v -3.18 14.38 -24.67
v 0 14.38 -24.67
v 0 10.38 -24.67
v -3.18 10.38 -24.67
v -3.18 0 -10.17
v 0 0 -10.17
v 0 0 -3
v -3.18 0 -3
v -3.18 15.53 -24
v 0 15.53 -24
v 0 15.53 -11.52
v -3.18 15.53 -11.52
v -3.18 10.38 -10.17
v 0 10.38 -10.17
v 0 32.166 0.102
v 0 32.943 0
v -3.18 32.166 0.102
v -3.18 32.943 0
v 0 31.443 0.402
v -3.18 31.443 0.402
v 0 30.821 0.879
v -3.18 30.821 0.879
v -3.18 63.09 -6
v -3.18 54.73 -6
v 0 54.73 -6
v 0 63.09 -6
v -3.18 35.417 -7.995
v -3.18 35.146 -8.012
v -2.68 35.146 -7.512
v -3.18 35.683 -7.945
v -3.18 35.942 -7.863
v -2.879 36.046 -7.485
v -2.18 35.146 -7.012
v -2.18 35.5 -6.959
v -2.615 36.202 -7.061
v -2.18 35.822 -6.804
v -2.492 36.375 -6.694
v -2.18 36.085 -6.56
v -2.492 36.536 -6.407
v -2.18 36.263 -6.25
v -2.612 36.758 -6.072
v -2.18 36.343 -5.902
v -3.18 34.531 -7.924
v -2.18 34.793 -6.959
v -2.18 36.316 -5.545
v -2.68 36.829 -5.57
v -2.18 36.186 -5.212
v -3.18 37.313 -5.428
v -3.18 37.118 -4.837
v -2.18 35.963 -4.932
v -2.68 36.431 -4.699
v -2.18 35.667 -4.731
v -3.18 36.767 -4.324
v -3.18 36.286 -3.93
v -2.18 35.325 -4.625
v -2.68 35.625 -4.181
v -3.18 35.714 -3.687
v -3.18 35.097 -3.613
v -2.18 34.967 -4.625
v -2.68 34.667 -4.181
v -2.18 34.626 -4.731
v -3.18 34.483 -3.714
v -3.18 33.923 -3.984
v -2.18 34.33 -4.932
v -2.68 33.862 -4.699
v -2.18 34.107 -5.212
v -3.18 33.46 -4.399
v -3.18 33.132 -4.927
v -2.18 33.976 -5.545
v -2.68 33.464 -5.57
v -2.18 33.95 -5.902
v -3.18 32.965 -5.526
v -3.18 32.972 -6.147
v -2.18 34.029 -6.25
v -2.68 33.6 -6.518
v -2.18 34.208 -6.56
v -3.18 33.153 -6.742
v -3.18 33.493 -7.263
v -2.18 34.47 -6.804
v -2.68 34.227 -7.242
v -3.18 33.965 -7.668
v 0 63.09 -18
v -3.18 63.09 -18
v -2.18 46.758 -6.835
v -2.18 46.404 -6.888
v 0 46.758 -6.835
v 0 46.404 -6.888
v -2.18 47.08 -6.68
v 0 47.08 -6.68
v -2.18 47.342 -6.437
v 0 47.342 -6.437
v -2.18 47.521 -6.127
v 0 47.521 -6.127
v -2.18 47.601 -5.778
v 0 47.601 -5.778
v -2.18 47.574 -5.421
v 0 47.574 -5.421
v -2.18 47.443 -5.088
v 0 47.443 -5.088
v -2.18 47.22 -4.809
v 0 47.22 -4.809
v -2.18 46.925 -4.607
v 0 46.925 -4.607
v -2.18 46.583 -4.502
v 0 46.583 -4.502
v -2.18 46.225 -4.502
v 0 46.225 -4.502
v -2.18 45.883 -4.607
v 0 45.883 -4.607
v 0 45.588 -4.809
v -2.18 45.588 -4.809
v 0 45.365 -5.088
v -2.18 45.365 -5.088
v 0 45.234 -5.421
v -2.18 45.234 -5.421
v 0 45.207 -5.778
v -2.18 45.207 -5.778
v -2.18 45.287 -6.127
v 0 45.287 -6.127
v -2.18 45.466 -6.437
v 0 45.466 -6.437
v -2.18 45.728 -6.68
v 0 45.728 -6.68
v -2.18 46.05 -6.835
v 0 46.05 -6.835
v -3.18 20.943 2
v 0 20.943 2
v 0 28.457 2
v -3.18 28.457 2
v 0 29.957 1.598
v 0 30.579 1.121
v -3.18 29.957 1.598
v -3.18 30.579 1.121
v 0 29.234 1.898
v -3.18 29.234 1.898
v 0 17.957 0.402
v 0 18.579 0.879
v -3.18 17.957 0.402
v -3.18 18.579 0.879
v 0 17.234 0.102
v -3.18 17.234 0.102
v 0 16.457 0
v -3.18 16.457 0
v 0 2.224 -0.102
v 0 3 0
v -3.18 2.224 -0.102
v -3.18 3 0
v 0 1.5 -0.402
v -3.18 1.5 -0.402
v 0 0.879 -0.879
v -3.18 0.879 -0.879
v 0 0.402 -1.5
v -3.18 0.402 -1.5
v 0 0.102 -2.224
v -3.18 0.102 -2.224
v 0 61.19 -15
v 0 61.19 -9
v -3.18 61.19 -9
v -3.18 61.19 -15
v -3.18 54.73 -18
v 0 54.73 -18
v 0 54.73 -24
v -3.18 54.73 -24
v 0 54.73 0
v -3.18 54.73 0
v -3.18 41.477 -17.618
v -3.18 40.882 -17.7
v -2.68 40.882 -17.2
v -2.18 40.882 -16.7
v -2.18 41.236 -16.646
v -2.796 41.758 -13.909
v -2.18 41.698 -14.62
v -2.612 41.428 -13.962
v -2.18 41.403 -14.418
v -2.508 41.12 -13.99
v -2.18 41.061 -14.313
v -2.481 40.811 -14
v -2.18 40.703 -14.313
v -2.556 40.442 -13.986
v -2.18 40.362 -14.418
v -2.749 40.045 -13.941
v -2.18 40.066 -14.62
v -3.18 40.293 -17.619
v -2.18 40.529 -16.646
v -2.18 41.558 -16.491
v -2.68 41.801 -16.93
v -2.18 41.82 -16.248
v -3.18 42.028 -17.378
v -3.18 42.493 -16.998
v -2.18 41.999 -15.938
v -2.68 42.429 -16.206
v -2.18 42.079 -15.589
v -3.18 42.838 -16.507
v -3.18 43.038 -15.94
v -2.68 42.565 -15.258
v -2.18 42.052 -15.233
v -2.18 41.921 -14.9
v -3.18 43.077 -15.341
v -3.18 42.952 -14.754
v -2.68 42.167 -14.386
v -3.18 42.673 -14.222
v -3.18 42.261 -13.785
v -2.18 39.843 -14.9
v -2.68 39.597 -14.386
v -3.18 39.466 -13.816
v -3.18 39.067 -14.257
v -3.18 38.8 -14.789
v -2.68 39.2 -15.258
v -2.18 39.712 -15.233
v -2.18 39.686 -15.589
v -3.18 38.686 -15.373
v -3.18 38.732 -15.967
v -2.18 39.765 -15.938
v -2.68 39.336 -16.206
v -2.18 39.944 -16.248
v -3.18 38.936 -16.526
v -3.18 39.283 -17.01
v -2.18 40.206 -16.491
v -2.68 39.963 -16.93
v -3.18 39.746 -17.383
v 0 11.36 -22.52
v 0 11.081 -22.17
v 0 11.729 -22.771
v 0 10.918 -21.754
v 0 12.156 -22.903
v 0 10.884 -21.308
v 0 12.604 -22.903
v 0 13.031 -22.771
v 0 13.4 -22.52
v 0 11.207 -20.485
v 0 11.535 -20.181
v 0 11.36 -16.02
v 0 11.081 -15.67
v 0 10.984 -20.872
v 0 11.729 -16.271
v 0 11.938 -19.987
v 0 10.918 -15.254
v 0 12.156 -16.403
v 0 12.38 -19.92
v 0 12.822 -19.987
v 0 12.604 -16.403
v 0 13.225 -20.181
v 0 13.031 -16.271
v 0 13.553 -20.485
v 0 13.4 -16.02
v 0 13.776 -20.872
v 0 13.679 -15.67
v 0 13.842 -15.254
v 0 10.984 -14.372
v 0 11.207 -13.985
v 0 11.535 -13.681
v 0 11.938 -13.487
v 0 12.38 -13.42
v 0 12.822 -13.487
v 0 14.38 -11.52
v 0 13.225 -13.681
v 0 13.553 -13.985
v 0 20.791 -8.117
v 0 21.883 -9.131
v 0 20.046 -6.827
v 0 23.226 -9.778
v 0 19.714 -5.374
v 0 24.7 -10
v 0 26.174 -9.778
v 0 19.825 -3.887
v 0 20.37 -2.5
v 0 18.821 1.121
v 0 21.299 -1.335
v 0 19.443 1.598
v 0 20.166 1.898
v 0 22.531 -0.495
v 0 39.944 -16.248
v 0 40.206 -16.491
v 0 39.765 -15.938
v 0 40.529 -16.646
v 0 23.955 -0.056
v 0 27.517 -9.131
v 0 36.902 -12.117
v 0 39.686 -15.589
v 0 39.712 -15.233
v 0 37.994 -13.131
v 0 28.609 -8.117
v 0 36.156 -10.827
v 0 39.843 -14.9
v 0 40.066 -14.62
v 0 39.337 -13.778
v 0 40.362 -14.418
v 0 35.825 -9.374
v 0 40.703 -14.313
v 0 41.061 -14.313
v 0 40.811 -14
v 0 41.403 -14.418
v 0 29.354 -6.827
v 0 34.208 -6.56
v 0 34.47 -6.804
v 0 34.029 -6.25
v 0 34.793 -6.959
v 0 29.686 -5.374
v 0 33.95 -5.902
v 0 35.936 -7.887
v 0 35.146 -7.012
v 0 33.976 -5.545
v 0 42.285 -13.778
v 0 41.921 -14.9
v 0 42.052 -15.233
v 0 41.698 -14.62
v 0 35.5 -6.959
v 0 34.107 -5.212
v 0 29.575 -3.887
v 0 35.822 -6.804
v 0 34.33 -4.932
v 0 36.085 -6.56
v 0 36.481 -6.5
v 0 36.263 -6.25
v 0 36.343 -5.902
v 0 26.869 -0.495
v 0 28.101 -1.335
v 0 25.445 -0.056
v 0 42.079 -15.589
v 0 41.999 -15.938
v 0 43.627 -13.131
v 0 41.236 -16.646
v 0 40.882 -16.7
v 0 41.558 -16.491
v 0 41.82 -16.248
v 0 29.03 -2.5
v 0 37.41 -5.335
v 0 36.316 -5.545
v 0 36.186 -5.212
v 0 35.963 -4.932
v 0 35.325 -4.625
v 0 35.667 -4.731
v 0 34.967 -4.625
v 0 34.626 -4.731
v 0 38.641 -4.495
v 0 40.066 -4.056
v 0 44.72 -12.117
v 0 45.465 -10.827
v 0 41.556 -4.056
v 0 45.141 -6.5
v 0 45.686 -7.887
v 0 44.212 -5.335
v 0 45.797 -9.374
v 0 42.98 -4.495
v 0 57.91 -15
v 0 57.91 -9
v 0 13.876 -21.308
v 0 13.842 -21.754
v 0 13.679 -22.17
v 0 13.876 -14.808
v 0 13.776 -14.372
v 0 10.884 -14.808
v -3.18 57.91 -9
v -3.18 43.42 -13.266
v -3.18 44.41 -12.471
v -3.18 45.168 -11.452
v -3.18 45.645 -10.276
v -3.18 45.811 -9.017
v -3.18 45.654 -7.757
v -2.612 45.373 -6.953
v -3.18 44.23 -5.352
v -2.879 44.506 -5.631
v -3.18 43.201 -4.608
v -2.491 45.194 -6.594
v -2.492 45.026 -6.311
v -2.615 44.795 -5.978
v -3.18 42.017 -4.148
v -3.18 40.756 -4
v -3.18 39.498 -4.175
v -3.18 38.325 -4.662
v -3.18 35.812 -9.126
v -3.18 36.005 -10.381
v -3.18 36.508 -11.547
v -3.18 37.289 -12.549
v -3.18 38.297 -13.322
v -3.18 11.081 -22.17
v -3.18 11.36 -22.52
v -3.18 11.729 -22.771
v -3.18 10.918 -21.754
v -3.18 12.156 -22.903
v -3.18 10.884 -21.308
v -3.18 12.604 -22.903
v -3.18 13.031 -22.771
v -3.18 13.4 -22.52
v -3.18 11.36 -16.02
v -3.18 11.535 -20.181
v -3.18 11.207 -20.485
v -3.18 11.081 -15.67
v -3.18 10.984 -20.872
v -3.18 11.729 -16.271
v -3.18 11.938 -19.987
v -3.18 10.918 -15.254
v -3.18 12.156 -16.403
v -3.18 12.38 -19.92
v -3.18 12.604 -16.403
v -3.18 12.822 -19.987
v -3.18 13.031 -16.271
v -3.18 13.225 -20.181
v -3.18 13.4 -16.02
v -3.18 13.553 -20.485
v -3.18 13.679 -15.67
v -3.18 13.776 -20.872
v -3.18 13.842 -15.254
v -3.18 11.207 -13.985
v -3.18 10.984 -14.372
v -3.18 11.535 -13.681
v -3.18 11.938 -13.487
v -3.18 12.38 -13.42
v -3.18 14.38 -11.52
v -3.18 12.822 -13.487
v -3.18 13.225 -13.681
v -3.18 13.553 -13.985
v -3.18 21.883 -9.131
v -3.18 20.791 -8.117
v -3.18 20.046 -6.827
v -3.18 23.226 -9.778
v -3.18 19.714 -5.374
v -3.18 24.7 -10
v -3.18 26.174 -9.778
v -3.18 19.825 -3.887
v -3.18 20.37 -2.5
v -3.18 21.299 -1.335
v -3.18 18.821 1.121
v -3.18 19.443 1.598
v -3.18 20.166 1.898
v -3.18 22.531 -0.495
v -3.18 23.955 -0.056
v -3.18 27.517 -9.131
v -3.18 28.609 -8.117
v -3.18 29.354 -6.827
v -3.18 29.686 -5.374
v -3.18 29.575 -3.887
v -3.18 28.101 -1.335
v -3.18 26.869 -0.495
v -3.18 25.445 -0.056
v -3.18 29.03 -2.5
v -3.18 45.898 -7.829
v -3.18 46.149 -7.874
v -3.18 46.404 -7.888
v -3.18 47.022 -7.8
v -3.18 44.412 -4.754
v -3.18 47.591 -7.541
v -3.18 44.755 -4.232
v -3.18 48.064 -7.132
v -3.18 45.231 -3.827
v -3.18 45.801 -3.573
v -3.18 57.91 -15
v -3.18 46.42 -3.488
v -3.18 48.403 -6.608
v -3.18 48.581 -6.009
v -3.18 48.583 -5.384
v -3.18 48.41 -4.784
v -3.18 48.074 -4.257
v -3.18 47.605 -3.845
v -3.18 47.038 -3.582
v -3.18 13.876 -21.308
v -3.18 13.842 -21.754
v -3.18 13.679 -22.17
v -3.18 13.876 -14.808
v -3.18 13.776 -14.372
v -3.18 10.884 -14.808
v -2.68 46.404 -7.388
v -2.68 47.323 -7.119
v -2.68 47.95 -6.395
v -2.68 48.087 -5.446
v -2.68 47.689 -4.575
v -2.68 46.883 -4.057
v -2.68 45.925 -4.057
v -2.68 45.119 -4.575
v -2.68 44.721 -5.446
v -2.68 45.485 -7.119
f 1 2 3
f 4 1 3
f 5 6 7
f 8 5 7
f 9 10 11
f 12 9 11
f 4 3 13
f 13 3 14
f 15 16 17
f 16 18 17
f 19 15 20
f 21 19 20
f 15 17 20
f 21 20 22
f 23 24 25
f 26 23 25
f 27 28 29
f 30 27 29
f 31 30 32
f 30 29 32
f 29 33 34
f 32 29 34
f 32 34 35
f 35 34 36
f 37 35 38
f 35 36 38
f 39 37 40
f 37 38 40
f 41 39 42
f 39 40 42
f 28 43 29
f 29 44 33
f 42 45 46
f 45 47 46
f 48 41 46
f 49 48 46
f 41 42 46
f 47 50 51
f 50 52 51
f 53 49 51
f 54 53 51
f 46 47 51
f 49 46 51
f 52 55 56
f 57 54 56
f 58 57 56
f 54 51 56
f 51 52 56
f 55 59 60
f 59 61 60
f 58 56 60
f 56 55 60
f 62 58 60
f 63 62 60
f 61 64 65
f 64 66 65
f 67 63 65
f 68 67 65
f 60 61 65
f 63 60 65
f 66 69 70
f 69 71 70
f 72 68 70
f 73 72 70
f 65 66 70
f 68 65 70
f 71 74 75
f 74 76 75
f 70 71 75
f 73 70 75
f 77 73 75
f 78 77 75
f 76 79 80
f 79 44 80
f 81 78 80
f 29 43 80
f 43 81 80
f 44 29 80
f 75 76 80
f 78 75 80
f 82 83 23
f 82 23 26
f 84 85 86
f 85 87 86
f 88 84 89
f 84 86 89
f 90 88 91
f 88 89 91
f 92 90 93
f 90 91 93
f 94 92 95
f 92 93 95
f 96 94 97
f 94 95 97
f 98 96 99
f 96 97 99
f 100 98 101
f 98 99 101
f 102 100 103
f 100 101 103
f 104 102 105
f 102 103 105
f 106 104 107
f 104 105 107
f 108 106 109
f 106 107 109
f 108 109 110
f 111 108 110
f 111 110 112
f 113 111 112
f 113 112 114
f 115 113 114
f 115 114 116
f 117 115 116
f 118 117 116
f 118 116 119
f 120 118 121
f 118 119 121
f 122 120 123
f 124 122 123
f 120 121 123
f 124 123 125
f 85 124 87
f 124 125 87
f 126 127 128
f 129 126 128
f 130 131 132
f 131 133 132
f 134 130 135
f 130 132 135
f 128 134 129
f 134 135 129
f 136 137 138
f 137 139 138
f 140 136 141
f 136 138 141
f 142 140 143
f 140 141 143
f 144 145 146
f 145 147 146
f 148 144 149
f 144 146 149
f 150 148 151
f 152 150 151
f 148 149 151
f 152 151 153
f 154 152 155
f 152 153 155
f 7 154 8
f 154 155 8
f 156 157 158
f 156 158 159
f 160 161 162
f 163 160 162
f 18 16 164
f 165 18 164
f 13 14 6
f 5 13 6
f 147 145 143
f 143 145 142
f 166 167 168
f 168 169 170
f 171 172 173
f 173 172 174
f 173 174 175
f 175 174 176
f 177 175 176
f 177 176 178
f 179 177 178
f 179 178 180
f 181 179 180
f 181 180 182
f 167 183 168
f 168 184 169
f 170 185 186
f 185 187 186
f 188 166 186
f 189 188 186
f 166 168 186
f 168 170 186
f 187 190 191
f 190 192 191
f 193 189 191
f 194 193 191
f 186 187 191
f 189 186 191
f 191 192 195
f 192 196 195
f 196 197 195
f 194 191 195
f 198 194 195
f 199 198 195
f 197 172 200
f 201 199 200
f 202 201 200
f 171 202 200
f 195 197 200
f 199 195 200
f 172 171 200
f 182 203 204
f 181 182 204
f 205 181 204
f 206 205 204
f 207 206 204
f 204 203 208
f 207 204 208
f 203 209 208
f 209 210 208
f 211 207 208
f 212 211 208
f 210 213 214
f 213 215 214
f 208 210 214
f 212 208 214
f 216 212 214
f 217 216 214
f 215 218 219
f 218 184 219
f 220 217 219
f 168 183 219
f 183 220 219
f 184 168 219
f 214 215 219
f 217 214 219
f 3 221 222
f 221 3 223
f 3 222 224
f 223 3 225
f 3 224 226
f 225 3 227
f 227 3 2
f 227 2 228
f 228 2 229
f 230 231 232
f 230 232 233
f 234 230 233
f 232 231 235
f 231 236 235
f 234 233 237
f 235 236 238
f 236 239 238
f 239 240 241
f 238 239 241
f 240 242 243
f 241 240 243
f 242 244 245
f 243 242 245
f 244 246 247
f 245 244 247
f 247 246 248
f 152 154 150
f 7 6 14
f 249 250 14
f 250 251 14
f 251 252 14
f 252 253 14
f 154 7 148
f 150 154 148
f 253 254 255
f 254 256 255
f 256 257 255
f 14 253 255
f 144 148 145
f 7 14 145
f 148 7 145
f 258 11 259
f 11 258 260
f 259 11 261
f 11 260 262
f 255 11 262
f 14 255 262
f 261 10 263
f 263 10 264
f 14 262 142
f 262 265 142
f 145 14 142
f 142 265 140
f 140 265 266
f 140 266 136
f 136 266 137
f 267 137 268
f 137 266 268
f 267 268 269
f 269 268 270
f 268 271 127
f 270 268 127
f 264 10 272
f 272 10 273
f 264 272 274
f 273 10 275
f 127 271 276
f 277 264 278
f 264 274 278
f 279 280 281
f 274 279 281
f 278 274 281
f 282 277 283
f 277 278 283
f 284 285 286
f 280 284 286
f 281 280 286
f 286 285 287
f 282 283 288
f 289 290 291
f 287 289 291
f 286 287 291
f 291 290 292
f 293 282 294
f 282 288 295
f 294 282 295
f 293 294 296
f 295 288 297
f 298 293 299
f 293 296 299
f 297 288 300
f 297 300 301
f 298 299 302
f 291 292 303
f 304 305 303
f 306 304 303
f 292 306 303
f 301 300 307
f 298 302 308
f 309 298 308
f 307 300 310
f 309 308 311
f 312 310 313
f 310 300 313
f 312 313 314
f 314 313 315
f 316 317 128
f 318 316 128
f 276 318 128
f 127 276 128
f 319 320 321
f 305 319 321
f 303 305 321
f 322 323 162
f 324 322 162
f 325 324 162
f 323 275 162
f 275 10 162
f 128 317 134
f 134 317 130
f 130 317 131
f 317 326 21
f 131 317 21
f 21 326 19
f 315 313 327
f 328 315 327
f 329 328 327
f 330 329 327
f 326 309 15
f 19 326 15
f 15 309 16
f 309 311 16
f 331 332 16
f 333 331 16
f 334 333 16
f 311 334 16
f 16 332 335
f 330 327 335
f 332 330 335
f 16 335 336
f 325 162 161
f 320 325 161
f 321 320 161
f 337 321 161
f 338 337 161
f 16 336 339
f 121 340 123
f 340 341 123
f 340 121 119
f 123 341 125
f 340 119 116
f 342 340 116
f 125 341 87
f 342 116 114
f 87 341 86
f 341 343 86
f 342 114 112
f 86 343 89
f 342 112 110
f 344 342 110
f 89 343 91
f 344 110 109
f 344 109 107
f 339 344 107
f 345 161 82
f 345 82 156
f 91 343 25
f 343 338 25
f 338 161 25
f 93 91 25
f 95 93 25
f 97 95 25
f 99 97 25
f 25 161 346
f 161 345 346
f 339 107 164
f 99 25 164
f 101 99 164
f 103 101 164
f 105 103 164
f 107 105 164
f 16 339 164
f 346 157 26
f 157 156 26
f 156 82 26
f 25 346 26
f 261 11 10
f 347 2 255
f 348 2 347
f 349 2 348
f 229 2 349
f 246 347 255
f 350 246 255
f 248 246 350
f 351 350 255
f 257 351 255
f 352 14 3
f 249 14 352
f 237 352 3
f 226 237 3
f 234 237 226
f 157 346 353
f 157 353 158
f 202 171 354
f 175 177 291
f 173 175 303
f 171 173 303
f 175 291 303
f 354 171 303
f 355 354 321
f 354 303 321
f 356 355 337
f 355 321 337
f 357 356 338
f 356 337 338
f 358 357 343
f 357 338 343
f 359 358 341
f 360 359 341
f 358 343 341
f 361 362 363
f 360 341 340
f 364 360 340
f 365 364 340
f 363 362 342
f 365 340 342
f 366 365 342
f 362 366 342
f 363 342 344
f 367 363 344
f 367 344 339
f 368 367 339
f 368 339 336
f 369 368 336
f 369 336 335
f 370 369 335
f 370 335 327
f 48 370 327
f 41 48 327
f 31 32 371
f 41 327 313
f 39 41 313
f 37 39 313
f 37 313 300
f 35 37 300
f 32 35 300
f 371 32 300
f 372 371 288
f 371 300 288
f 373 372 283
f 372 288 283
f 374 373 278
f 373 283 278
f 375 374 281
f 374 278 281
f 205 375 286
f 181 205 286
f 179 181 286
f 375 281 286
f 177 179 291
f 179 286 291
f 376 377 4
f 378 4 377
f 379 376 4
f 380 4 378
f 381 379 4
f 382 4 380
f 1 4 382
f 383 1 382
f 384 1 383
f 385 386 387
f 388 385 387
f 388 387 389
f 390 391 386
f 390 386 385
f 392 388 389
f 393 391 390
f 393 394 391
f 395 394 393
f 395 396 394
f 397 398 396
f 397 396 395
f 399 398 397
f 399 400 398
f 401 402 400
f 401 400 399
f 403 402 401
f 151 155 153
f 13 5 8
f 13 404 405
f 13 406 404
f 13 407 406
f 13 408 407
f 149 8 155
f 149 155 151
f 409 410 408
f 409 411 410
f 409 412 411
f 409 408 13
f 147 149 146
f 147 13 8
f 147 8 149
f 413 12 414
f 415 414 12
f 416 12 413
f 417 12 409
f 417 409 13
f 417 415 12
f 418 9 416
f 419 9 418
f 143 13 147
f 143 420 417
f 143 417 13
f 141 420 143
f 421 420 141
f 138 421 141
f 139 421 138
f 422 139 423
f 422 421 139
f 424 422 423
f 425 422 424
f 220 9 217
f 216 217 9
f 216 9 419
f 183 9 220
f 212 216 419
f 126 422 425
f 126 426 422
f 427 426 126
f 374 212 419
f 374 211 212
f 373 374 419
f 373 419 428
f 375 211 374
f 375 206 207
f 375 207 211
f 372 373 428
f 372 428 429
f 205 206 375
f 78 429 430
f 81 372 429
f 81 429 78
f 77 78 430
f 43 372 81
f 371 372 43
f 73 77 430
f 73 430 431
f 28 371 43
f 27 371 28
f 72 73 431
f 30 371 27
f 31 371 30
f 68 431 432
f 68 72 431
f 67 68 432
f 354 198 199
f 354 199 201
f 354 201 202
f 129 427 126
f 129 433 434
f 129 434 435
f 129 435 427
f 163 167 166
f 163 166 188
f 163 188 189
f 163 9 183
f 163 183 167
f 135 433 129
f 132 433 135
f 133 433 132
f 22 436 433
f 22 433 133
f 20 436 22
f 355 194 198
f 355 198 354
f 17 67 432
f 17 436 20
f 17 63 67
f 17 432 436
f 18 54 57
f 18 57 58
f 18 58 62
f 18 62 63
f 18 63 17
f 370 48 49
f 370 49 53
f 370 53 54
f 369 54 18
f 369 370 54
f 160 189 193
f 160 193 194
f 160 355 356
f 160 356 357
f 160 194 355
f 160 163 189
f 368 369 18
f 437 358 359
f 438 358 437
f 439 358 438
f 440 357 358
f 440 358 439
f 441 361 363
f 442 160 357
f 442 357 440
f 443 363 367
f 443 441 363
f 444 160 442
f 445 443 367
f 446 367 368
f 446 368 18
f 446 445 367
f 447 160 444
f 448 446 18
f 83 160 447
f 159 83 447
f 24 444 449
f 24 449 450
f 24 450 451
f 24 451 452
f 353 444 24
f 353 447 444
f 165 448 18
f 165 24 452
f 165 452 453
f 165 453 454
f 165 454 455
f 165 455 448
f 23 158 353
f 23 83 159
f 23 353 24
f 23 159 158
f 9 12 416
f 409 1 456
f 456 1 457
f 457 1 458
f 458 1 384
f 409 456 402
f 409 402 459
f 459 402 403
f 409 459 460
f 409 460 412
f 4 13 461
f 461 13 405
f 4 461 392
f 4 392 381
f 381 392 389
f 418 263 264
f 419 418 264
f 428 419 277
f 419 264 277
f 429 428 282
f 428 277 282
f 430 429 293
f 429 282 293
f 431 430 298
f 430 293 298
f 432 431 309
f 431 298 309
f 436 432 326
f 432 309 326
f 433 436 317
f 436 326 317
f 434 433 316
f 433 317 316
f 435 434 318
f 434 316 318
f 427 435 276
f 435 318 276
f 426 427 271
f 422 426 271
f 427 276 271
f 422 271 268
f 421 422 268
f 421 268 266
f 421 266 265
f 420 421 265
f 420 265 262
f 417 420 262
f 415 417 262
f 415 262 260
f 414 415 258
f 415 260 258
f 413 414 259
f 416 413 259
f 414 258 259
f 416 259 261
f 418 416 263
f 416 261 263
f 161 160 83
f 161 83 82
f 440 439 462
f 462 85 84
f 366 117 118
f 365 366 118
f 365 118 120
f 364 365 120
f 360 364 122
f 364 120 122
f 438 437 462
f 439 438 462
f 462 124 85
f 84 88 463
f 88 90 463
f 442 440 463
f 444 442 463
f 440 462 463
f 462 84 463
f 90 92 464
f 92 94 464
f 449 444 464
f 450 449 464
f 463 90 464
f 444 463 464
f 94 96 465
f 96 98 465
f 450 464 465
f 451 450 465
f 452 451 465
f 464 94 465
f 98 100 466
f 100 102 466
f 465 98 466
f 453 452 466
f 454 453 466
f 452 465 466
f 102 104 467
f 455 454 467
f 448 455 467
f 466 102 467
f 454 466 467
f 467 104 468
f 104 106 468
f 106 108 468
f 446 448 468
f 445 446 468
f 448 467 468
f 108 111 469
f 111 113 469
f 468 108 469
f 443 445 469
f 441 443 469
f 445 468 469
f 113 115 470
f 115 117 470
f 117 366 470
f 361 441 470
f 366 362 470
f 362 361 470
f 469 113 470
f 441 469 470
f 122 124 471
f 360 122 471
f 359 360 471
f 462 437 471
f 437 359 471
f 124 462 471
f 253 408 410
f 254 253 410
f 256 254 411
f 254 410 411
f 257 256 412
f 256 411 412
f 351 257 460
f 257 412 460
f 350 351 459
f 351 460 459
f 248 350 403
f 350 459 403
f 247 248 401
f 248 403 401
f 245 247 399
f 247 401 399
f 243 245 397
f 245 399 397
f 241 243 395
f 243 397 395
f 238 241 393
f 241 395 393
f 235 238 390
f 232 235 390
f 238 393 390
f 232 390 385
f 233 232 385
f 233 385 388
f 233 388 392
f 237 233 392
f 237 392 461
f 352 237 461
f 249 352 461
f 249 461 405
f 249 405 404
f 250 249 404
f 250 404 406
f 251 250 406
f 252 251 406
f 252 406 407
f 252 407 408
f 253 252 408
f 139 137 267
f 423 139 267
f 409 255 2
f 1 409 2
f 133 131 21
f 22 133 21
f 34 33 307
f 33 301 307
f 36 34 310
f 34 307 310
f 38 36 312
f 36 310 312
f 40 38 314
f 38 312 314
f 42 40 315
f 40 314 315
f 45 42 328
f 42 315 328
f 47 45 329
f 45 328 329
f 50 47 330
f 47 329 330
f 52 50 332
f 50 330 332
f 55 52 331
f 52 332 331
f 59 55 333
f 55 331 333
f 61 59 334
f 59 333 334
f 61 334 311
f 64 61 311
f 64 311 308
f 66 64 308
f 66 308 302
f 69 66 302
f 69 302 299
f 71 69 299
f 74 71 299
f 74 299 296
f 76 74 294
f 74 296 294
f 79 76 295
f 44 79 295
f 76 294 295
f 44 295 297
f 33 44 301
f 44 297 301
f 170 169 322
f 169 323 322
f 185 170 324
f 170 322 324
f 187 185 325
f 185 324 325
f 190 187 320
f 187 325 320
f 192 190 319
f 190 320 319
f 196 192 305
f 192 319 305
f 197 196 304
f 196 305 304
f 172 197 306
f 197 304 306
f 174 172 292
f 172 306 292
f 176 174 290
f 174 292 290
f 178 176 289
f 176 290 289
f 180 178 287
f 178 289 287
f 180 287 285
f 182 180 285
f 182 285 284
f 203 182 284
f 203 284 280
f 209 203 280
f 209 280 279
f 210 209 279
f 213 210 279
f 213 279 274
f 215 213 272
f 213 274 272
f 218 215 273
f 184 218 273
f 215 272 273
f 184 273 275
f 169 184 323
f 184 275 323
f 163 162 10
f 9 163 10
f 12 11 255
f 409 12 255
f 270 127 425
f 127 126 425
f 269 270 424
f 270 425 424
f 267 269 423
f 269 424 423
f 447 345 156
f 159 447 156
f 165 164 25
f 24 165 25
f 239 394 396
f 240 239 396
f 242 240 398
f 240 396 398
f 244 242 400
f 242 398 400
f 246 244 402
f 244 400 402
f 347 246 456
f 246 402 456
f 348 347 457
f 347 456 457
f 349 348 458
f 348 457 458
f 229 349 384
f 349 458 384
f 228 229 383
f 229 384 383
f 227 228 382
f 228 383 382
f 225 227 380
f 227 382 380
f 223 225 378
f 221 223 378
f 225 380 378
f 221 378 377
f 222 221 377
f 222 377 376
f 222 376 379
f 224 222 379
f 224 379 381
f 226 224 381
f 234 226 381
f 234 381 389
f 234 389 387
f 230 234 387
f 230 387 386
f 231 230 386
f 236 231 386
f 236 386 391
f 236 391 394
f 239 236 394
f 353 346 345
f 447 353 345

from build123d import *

# Parameters (mm, degrees)
BOSS_EXTRUDE1_DEPTH                             = 3.18
SKETCH2_4_OUTSIDE_W                             = 40.864
SKETCH2_4_OUTSIDE_H                             = 68.924
SKETCH2_4_OUTSIDE_R                             = 5
CUT_EXTRUDE2_DEPTH                              = 3.18
FILLET6_R                                       = 3
CSK_FOR_M2_FLAT_HEAD_MACHINE_SCREW2_D           = 2.4
CSK_FOR_M2_FLAT_HEAD_MACHINE_SCREW2_CSINK_D     = 4.4
CSK_FOR_M2_FLAT_HEAD_MACHINE_SCREW2_CSINK_ANGLE = 90
M3X0_5_TAPPED_HOLE1_D                           = 3
M3X0_5_TAPPED_HOLE1_DEPTH                       = 3.328709071
M3X0_5_TAPPED_HOLE1_TIP                         = 0.901290929
SKETCH16_W                                      = 3.18
SKETCH16_H                                      = 12
BOSS_EXTRUDE2_DEPTH                             = 8.36
SKETCH18_W                                      = 6
SKETCH18_H                                      = 3.28
CUT_EXTRUDE3_DEPTH                              = 68.816439015


with BuildPart() as part:
    # Sketch2 → Boss-Extrude1 (new body)
    with BuildSketch(Plane(origin=(0, 0, 0), x_dir=(0, 0, -1), z_dir=(1, 0, 0))):
        Polygon((0, 54.73), (24, 54.73), (24, 15.53), (11.52, 15.53), (11.52, 14.38), (24.67, 14.38), (24.67, 10.38), (10.17, 10.38), (10.17, 0), (0, 0), (0, 17.7), (-2, 19.7), (-2, 29.7), (0, 31.7), align=None)
    extrude(amount=-BOSS_EXTRUDE1_DEPTH)

    # Sketch2<4> outside → Cut-Extrude2 (cut)
    # profile 1 of 3: a face of its own
    with BuildSketch(Plane(origin=(0, 0, 0), x_dir=(0, 0, -1), z_dir=(1, 0, 0))):
        with Locations((11.335, 27.365)):
            Rectangle(SKETCH2_4_OUTSIDE_W, SKETCH2_4_OUTSIDE_H)
        Polygon((0, 54.73), (24, 54.73), (24, 15.53), (11.52, 15.53), (11.52, 14.38), (24.67, 14.38), (24.67, 10.38), (10.17, 10.38), (10.17, 0), (0, 0), (0, 17.7), (-2, 19.7), (-2, 29.7), (0, 31.7), align=None, mode=Mode.SUBTRACT)
    # profile 2 of 3: a face of its own
    with BuildSketch(Plane(origin=(0, 0, 0), x_dir=(0, 0, -1), z_dir=(1, 0, 0))):
        with Locations((5, 24.7)):
            Circle(SKETCH2_4_OUTSIDE_R)
    # profile 3 of 3: a face of its own
    with BuildSketch(Plane(origin=(0, 0, 0), x_dir=(0, 0, -1), z_dir=(1, 0, 0))):
        with Locations((9, 40.810865899)):
            Circle(SKETCH2_4_OUTSIDE_R)
    extrude(amount=-CUT_EXTRUDE2_DEPTH, mode=Mode.SUBTRACT)

    # Fillet6
    fillet6_edges = [part.edges().sort_by_distance(p)[0] for p in [
        (-1.59, 31.7, 0),
        (-1.59, 29.7, 2),
        (-1.59, 19.7, 2),
        (-1.59, 17.7, 0),
        (-1.59, 0, 0),
    ]]
    fillet(fillet6_edges, radius=FILLET6_R)

    # CSK for M2 Flat Head Machine Screw2 (through all)
    with Locations(Plane.ZY.offset(3.18)):
        with Locations((-5.688374042, 46.403998609), (-15.499607993, 40.882251751), (-5.812017965, 35.146347336)):
            CounterSinkHole(CSK_FOR_M2_FLAT_HEAD_MACHINE_SCREW2_D / 2, CSK_FOR_M2_FLAT_HEAD_MACHINE_SCREW2_CSINK_D / 2, counter_sink_angle=CSK_FOR_M2_FLAT_HEAD_MACHINE_SCREW2_CSINK_ANGLE)

    # M3x0.5 Tapped Hole1
    with Locations(Plane(origin=(0, 0, 0), x_dir=(0, 0, -1), z_dir=(1, 0, 0))):
        with Locations((21.42, 12.38), (14.92, 12.38)):
            Hole(M3X0_5_TAPPED_HOLE1_D / 2, depth=M3X0_5_TAPPED_HOLE1_DEPTH)
            with Locations((0, 0, -(M3X0_5_TAPPED_HOLE1_DEPTH + M3X0_5_TAPPED_HOLE1_TIP / 2))):  # 118° drill point
                Cone(0, M3X0_5_TAPPED_HOLE1_D / 2, M3X0_5_TAPPED_HOLE1_TIP, mode=Mode.SUBTRACT)

    # Sketch16 → Boss-Extrude2 (add)
    with BuildSketch(Plane(origin=(0, 54.73, 0), x_dir=(1, 0, 0), z_dir=(0, 1, 0))):
        with Locations((-1.59, 12)):
            Rectangle(SKETCH16_W, SKETCH16_H)
    extrude(amount=BOSS_EXTRUDE2_DEPTH)

    # Sketch18 → Cut-Extrude3 (cut, through all)
    with BuildSketch(Plane(origin=(0, 0, 0), x_dir=(0, 0, -1), z_dir=(1, 0, 0))):
        with Locations((12, 59.55)):
            Rectangle(SKETCH18_W, SKETCH18_H)
    extrude(amount=-CUT_EXTRUDE3_DEPTH, mode=Mode.SUBTRACT)


solid = part.part
